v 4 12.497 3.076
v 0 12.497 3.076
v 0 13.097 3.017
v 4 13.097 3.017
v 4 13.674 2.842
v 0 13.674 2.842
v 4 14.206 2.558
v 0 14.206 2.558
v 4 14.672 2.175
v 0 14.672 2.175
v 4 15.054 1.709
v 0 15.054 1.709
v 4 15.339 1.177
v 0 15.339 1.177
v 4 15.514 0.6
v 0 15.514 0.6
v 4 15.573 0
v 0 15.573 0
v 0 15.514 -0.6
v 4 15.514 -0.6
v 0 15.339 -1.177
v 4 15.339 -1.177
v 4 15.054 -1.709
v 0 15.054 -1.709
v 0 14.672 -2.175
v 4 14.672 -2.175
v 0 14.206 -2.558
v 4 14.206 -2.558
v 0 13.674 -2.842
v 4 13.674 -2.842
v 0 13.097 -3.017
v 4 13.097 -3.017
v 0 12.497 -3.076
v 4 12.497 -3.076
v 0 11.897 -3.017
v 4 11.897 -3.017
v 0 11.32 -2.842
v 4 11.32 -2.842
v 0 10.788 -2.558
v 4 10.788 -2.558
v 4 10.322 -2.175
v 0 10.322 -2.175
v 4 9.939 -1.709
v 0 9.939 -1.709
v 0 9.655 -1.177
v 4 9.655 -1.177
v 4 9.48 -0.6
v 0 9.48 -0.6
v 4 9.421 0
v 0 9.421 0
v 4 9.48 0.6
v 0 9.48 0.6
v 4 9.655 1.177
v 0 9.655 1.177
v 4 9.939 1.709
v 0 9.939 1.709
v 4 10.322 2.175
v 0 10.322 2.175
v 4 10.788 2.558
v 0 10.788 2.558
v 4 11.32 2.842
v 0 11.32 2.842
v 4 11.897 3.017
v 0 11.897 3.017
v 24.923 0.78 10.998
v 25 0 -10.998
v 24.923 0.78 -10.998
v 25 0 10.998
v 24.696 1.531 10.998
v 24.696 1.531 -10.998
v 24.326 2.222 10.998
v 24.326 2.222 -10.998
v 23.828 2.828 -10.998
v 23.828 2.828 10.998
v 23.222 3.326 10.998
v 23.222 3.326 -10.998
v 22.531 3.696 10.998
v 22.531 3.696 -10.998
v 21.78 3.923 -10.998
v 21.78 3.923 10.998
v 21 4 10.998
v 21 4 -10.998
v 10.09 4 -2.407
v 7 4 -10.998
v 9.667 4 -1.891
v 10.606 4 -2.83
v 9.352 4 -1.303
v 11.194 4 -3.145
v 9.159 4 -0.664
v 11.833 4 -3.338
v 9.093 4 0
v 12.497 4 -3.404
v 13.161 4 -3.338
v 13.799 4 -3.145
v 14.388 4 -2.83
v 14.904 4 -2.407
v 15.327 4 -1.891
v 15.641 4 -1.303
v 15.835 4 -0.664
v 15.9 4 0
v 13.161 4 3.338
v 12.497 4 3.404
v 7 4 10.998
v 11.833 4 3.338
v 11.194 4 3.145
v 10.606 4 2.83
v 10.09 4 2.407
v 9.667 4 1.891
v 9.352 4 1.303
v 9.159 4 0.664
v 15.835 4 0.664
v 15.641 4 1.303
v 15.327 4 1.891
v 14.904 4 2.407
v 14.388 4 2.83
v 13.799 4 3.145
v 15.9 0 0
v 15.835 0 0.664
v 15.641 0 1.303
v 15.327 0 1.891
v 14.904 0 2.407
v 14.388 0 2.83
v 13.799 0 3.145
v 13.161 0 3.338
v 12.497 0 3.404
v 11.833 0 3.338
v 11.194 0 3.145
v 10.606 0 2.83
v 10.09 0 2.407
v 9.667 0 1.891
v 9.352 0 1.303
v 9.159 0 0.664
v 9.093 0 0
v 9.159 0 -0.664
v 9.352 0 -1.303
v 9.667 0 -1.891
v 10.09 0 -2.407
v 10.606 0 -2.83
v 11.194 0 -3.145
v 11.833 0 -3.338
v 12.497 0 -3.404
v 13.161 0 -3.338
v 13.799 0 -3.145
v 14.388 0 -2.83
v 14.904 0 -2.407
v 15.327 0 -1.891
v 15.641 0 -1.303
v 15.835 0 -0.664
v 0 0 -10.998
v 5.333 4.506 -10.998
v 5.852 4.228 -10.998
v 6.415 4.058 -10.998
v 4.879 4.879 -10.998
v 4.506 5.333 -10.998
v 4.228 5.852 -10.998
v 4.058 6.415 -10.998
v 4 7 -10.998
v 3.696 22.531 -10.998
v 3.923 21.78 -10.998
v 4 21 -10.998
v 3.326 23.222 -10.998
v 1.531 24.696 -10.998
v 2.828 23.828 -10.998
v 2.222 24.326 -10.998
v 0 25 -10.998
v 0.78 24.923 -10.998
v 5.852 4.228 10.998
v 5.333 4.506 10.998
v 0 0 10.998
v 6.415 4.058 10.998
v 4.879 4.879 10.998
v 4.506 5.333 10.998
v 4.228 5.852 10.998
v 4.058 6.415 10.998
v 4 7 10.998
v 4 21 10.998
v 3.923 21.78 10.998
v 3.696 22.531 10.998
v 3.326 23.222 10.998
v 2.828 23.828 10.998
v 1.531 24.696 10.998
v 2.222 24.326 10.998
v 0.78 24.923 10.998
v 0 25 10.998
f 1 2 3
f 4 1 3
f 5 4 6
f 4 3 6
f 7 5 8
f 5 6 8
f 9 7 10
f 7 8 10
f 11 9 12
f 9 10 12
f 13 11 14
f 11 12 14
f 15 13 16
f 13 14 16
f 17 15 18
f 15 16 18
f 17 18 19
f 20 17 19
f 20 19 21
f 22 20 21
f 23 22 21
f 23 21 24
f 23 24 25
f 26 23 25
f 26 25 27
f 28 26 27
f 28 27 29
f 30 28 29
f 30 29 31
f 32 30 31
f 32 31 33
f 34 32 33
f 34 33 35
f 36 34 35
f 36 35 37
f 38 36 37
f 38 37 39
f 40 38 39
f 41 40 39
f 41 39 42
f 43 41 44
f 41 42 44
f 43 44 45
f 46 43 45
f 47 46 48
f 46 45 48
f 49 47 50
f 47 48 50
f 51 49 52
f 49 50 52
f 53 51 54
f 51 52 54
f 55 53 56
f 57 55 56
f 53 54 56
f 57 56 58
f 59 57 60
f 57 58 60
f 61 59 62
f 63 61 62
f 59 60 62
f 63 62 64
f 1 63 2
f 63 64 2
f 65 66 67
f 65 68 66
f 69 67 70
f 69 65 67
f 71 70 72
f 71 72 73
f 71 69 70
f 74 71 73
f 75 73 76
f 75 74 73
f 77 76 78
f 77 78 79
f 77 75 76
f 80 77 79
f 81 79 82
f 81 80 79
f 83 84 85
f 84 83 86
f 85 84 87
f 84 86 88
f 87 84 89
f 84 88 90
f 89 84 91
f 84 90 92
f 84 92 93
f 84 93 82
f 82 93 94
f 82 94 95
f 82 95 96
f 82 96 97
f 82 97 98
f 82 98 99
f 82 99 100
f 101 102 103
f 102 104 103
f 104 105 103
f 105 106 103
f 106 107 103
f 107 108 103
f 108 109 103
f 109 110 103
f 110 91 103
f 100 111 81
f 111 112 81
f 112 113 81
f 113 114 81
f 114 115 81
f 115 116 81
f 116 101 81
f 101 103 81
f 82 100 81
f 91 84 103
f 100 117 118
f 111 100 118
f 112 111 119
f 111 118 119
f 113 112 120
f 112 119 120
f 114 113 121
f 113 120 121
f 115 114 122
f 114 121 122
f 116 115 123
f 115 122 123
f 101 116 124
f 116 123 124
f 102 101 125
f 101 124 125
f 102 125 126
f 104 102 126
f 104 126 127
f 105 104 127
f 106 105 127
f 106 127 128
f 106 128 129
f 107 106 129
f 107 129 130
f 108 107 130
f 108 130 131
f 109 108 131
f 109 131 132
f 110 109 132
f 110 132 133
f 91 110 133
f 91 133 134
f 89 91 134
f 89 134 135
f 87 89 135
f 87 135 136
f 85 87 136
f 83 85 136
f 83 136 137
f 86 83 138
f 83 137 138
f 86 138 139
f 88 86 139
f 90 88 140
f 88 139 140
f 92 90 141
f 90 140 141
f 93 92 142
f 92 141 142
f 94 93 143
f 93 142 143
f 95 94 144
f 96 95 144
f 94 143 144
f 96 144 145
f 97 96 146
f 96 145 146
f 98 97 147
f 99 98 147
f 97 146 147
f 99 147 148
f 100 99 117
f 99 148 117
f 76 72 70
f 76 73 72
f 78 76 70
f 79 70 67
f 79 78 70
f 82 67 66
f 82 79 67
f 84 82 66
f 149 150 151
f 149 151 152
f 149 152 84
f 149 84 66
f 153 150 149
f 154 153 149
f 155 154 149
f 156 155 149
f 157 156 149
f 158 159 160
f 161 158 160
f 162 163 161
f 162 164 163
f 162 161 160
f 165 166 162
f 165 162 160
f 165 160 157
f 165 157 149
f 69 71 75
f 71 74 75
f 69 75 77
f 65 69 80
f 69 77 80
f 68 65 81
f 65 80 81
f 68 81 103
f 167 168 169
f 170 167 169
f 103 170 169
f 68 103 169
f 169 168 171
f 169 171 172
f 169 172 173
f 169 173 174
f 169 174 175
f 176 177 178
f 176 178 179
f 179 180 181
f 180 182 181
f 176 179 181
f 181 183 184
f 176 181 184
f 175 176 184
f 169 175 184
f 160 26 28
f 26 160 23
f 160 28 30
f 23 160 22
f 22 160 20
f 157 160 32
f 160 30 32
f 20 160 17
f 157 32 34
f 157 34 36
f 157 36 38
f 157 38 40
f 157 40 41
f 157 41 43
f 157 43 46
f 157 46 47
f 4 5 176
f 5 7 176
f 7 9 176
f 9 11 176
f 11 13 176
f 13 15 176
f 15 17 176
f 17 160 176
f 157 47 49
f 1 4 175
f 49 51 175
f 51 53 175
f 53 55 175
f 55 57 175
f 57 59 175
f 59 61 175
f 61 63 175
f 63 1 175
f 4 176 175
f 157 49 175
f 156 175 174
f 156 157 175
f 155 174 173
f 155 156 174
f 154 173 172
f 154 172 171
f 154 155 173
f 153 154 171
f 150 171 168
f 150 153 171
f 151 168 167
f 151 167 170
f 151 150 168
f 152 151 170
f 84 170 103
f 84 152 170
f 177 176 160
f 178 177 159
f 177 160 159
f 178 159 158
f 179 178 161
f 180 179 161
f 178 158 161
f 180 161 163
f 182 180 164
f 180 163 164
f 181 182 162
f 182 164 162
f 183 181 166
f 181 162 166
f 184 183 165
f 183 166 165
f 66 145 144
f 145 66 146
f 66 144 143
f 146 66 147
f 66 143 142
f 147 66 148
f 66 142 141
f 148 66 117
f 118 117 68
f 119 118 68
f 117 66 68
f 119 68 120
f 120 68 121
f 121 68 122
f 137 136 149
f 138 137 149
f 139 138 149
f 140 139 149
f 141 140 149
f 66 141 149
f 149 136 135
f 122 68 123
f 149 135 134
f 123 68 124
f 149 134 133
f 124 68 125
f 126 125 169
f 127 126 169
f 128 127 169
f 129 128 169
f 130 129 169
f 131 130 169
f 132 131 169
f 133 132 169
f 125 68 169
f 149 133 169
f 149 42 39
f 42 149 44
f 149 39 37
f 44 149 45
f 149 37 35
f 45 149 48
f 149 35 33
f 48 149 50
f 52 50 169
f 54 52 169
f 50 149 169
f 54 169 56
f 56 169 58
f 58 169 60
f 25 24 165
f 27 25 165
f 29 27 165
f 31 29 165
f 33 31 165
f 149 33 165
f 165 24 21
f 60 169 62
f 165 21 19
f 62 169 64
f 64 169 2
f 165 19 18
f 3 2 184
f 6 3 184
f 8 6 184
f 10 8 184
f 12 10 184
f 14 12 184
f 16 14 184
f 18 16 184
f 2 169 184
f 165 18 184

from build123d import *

# Parameters (mm, degrees)
BOSS_EXTRUDE1_DEPTH = 10.9982
FILLET1_R           = 4
FILLET2_R           = 3
CUT_EXTRUDE1_REACH  = 39.026
SKETCH2_R           = 3.4036
CUT_EXTRUDE2_REACH  = 39.026
SKETCH4_R           = 3.075953135


with BuildPart() as part:
    # Sketch1 → Boss-Extrude1 (new, symmetric)
    with BuildSketch(Plane.XY):
        Polygon((0, 0), (0, 25), (4, 25), (4, 4), (25, 4), (25, 0), align=None)
    extrude(amount=BOSS_EXTRUDE1_DEPTH, both=True)

    # Fillet1
    fillet1_edges = [part.edges().sort_by_distance(p)[0] for p in [
        (25, 4, 0),
        (4, 25, 0),
    ]]
    fillet(fillet1_edges, radius=FILLET1_R - 0.0001)  # a hair under: the kernel refuses the full size

    # Fillet2
    fillet2_edges = [part.edges().sort_by_distance(p)[0] for p in [
        (4, 4, 0),
    ]]
    fillet(fillet2_edges, radius=FILLET2_R)

    # Sketch2 → Cut-Extrude1 (cut, up to next)
    with BuildSketch(Plane.XZ, mode=Mode.PRIVATE) as cut_extrude1_sk1:
        with Locations((12.4968, 0)):
            Circle(SKETCH2_R)
    cut_extrude1_tool1 = extrude(cut_extrude1_sk1.sketch, amount=-CUT_EXTRUDE1_REACH, mode=Mode.PRIVATE) & part.part
    add(cut_extrude1_tool1.solids().sort_by_distance((12.4968, 0, 0))[0], mode=Mode.SUBTRACT)

    # Sketch4 → Cut-Extrude2 (cut, up to next)
    with BuildSketch(Plane.ZY, mode=Mode.PRIVATE) as cut_extrude2_sk1:
        with Locations((0, 12.4968)):
            Circle(SKETCH4_R)
    cut_extrude2_tool1 = extrude(cut_extrude2_sk1.sketch, amount=-CUT_EXTRUDE2_REACH, mode=Mode.PRIVATE) & part.part
    add(cut_extrude2_tool1.solids().sort_by_distance((0, 12.4968, 0))[0], mode=Mode.SUBTRACT)


solid = part.part
